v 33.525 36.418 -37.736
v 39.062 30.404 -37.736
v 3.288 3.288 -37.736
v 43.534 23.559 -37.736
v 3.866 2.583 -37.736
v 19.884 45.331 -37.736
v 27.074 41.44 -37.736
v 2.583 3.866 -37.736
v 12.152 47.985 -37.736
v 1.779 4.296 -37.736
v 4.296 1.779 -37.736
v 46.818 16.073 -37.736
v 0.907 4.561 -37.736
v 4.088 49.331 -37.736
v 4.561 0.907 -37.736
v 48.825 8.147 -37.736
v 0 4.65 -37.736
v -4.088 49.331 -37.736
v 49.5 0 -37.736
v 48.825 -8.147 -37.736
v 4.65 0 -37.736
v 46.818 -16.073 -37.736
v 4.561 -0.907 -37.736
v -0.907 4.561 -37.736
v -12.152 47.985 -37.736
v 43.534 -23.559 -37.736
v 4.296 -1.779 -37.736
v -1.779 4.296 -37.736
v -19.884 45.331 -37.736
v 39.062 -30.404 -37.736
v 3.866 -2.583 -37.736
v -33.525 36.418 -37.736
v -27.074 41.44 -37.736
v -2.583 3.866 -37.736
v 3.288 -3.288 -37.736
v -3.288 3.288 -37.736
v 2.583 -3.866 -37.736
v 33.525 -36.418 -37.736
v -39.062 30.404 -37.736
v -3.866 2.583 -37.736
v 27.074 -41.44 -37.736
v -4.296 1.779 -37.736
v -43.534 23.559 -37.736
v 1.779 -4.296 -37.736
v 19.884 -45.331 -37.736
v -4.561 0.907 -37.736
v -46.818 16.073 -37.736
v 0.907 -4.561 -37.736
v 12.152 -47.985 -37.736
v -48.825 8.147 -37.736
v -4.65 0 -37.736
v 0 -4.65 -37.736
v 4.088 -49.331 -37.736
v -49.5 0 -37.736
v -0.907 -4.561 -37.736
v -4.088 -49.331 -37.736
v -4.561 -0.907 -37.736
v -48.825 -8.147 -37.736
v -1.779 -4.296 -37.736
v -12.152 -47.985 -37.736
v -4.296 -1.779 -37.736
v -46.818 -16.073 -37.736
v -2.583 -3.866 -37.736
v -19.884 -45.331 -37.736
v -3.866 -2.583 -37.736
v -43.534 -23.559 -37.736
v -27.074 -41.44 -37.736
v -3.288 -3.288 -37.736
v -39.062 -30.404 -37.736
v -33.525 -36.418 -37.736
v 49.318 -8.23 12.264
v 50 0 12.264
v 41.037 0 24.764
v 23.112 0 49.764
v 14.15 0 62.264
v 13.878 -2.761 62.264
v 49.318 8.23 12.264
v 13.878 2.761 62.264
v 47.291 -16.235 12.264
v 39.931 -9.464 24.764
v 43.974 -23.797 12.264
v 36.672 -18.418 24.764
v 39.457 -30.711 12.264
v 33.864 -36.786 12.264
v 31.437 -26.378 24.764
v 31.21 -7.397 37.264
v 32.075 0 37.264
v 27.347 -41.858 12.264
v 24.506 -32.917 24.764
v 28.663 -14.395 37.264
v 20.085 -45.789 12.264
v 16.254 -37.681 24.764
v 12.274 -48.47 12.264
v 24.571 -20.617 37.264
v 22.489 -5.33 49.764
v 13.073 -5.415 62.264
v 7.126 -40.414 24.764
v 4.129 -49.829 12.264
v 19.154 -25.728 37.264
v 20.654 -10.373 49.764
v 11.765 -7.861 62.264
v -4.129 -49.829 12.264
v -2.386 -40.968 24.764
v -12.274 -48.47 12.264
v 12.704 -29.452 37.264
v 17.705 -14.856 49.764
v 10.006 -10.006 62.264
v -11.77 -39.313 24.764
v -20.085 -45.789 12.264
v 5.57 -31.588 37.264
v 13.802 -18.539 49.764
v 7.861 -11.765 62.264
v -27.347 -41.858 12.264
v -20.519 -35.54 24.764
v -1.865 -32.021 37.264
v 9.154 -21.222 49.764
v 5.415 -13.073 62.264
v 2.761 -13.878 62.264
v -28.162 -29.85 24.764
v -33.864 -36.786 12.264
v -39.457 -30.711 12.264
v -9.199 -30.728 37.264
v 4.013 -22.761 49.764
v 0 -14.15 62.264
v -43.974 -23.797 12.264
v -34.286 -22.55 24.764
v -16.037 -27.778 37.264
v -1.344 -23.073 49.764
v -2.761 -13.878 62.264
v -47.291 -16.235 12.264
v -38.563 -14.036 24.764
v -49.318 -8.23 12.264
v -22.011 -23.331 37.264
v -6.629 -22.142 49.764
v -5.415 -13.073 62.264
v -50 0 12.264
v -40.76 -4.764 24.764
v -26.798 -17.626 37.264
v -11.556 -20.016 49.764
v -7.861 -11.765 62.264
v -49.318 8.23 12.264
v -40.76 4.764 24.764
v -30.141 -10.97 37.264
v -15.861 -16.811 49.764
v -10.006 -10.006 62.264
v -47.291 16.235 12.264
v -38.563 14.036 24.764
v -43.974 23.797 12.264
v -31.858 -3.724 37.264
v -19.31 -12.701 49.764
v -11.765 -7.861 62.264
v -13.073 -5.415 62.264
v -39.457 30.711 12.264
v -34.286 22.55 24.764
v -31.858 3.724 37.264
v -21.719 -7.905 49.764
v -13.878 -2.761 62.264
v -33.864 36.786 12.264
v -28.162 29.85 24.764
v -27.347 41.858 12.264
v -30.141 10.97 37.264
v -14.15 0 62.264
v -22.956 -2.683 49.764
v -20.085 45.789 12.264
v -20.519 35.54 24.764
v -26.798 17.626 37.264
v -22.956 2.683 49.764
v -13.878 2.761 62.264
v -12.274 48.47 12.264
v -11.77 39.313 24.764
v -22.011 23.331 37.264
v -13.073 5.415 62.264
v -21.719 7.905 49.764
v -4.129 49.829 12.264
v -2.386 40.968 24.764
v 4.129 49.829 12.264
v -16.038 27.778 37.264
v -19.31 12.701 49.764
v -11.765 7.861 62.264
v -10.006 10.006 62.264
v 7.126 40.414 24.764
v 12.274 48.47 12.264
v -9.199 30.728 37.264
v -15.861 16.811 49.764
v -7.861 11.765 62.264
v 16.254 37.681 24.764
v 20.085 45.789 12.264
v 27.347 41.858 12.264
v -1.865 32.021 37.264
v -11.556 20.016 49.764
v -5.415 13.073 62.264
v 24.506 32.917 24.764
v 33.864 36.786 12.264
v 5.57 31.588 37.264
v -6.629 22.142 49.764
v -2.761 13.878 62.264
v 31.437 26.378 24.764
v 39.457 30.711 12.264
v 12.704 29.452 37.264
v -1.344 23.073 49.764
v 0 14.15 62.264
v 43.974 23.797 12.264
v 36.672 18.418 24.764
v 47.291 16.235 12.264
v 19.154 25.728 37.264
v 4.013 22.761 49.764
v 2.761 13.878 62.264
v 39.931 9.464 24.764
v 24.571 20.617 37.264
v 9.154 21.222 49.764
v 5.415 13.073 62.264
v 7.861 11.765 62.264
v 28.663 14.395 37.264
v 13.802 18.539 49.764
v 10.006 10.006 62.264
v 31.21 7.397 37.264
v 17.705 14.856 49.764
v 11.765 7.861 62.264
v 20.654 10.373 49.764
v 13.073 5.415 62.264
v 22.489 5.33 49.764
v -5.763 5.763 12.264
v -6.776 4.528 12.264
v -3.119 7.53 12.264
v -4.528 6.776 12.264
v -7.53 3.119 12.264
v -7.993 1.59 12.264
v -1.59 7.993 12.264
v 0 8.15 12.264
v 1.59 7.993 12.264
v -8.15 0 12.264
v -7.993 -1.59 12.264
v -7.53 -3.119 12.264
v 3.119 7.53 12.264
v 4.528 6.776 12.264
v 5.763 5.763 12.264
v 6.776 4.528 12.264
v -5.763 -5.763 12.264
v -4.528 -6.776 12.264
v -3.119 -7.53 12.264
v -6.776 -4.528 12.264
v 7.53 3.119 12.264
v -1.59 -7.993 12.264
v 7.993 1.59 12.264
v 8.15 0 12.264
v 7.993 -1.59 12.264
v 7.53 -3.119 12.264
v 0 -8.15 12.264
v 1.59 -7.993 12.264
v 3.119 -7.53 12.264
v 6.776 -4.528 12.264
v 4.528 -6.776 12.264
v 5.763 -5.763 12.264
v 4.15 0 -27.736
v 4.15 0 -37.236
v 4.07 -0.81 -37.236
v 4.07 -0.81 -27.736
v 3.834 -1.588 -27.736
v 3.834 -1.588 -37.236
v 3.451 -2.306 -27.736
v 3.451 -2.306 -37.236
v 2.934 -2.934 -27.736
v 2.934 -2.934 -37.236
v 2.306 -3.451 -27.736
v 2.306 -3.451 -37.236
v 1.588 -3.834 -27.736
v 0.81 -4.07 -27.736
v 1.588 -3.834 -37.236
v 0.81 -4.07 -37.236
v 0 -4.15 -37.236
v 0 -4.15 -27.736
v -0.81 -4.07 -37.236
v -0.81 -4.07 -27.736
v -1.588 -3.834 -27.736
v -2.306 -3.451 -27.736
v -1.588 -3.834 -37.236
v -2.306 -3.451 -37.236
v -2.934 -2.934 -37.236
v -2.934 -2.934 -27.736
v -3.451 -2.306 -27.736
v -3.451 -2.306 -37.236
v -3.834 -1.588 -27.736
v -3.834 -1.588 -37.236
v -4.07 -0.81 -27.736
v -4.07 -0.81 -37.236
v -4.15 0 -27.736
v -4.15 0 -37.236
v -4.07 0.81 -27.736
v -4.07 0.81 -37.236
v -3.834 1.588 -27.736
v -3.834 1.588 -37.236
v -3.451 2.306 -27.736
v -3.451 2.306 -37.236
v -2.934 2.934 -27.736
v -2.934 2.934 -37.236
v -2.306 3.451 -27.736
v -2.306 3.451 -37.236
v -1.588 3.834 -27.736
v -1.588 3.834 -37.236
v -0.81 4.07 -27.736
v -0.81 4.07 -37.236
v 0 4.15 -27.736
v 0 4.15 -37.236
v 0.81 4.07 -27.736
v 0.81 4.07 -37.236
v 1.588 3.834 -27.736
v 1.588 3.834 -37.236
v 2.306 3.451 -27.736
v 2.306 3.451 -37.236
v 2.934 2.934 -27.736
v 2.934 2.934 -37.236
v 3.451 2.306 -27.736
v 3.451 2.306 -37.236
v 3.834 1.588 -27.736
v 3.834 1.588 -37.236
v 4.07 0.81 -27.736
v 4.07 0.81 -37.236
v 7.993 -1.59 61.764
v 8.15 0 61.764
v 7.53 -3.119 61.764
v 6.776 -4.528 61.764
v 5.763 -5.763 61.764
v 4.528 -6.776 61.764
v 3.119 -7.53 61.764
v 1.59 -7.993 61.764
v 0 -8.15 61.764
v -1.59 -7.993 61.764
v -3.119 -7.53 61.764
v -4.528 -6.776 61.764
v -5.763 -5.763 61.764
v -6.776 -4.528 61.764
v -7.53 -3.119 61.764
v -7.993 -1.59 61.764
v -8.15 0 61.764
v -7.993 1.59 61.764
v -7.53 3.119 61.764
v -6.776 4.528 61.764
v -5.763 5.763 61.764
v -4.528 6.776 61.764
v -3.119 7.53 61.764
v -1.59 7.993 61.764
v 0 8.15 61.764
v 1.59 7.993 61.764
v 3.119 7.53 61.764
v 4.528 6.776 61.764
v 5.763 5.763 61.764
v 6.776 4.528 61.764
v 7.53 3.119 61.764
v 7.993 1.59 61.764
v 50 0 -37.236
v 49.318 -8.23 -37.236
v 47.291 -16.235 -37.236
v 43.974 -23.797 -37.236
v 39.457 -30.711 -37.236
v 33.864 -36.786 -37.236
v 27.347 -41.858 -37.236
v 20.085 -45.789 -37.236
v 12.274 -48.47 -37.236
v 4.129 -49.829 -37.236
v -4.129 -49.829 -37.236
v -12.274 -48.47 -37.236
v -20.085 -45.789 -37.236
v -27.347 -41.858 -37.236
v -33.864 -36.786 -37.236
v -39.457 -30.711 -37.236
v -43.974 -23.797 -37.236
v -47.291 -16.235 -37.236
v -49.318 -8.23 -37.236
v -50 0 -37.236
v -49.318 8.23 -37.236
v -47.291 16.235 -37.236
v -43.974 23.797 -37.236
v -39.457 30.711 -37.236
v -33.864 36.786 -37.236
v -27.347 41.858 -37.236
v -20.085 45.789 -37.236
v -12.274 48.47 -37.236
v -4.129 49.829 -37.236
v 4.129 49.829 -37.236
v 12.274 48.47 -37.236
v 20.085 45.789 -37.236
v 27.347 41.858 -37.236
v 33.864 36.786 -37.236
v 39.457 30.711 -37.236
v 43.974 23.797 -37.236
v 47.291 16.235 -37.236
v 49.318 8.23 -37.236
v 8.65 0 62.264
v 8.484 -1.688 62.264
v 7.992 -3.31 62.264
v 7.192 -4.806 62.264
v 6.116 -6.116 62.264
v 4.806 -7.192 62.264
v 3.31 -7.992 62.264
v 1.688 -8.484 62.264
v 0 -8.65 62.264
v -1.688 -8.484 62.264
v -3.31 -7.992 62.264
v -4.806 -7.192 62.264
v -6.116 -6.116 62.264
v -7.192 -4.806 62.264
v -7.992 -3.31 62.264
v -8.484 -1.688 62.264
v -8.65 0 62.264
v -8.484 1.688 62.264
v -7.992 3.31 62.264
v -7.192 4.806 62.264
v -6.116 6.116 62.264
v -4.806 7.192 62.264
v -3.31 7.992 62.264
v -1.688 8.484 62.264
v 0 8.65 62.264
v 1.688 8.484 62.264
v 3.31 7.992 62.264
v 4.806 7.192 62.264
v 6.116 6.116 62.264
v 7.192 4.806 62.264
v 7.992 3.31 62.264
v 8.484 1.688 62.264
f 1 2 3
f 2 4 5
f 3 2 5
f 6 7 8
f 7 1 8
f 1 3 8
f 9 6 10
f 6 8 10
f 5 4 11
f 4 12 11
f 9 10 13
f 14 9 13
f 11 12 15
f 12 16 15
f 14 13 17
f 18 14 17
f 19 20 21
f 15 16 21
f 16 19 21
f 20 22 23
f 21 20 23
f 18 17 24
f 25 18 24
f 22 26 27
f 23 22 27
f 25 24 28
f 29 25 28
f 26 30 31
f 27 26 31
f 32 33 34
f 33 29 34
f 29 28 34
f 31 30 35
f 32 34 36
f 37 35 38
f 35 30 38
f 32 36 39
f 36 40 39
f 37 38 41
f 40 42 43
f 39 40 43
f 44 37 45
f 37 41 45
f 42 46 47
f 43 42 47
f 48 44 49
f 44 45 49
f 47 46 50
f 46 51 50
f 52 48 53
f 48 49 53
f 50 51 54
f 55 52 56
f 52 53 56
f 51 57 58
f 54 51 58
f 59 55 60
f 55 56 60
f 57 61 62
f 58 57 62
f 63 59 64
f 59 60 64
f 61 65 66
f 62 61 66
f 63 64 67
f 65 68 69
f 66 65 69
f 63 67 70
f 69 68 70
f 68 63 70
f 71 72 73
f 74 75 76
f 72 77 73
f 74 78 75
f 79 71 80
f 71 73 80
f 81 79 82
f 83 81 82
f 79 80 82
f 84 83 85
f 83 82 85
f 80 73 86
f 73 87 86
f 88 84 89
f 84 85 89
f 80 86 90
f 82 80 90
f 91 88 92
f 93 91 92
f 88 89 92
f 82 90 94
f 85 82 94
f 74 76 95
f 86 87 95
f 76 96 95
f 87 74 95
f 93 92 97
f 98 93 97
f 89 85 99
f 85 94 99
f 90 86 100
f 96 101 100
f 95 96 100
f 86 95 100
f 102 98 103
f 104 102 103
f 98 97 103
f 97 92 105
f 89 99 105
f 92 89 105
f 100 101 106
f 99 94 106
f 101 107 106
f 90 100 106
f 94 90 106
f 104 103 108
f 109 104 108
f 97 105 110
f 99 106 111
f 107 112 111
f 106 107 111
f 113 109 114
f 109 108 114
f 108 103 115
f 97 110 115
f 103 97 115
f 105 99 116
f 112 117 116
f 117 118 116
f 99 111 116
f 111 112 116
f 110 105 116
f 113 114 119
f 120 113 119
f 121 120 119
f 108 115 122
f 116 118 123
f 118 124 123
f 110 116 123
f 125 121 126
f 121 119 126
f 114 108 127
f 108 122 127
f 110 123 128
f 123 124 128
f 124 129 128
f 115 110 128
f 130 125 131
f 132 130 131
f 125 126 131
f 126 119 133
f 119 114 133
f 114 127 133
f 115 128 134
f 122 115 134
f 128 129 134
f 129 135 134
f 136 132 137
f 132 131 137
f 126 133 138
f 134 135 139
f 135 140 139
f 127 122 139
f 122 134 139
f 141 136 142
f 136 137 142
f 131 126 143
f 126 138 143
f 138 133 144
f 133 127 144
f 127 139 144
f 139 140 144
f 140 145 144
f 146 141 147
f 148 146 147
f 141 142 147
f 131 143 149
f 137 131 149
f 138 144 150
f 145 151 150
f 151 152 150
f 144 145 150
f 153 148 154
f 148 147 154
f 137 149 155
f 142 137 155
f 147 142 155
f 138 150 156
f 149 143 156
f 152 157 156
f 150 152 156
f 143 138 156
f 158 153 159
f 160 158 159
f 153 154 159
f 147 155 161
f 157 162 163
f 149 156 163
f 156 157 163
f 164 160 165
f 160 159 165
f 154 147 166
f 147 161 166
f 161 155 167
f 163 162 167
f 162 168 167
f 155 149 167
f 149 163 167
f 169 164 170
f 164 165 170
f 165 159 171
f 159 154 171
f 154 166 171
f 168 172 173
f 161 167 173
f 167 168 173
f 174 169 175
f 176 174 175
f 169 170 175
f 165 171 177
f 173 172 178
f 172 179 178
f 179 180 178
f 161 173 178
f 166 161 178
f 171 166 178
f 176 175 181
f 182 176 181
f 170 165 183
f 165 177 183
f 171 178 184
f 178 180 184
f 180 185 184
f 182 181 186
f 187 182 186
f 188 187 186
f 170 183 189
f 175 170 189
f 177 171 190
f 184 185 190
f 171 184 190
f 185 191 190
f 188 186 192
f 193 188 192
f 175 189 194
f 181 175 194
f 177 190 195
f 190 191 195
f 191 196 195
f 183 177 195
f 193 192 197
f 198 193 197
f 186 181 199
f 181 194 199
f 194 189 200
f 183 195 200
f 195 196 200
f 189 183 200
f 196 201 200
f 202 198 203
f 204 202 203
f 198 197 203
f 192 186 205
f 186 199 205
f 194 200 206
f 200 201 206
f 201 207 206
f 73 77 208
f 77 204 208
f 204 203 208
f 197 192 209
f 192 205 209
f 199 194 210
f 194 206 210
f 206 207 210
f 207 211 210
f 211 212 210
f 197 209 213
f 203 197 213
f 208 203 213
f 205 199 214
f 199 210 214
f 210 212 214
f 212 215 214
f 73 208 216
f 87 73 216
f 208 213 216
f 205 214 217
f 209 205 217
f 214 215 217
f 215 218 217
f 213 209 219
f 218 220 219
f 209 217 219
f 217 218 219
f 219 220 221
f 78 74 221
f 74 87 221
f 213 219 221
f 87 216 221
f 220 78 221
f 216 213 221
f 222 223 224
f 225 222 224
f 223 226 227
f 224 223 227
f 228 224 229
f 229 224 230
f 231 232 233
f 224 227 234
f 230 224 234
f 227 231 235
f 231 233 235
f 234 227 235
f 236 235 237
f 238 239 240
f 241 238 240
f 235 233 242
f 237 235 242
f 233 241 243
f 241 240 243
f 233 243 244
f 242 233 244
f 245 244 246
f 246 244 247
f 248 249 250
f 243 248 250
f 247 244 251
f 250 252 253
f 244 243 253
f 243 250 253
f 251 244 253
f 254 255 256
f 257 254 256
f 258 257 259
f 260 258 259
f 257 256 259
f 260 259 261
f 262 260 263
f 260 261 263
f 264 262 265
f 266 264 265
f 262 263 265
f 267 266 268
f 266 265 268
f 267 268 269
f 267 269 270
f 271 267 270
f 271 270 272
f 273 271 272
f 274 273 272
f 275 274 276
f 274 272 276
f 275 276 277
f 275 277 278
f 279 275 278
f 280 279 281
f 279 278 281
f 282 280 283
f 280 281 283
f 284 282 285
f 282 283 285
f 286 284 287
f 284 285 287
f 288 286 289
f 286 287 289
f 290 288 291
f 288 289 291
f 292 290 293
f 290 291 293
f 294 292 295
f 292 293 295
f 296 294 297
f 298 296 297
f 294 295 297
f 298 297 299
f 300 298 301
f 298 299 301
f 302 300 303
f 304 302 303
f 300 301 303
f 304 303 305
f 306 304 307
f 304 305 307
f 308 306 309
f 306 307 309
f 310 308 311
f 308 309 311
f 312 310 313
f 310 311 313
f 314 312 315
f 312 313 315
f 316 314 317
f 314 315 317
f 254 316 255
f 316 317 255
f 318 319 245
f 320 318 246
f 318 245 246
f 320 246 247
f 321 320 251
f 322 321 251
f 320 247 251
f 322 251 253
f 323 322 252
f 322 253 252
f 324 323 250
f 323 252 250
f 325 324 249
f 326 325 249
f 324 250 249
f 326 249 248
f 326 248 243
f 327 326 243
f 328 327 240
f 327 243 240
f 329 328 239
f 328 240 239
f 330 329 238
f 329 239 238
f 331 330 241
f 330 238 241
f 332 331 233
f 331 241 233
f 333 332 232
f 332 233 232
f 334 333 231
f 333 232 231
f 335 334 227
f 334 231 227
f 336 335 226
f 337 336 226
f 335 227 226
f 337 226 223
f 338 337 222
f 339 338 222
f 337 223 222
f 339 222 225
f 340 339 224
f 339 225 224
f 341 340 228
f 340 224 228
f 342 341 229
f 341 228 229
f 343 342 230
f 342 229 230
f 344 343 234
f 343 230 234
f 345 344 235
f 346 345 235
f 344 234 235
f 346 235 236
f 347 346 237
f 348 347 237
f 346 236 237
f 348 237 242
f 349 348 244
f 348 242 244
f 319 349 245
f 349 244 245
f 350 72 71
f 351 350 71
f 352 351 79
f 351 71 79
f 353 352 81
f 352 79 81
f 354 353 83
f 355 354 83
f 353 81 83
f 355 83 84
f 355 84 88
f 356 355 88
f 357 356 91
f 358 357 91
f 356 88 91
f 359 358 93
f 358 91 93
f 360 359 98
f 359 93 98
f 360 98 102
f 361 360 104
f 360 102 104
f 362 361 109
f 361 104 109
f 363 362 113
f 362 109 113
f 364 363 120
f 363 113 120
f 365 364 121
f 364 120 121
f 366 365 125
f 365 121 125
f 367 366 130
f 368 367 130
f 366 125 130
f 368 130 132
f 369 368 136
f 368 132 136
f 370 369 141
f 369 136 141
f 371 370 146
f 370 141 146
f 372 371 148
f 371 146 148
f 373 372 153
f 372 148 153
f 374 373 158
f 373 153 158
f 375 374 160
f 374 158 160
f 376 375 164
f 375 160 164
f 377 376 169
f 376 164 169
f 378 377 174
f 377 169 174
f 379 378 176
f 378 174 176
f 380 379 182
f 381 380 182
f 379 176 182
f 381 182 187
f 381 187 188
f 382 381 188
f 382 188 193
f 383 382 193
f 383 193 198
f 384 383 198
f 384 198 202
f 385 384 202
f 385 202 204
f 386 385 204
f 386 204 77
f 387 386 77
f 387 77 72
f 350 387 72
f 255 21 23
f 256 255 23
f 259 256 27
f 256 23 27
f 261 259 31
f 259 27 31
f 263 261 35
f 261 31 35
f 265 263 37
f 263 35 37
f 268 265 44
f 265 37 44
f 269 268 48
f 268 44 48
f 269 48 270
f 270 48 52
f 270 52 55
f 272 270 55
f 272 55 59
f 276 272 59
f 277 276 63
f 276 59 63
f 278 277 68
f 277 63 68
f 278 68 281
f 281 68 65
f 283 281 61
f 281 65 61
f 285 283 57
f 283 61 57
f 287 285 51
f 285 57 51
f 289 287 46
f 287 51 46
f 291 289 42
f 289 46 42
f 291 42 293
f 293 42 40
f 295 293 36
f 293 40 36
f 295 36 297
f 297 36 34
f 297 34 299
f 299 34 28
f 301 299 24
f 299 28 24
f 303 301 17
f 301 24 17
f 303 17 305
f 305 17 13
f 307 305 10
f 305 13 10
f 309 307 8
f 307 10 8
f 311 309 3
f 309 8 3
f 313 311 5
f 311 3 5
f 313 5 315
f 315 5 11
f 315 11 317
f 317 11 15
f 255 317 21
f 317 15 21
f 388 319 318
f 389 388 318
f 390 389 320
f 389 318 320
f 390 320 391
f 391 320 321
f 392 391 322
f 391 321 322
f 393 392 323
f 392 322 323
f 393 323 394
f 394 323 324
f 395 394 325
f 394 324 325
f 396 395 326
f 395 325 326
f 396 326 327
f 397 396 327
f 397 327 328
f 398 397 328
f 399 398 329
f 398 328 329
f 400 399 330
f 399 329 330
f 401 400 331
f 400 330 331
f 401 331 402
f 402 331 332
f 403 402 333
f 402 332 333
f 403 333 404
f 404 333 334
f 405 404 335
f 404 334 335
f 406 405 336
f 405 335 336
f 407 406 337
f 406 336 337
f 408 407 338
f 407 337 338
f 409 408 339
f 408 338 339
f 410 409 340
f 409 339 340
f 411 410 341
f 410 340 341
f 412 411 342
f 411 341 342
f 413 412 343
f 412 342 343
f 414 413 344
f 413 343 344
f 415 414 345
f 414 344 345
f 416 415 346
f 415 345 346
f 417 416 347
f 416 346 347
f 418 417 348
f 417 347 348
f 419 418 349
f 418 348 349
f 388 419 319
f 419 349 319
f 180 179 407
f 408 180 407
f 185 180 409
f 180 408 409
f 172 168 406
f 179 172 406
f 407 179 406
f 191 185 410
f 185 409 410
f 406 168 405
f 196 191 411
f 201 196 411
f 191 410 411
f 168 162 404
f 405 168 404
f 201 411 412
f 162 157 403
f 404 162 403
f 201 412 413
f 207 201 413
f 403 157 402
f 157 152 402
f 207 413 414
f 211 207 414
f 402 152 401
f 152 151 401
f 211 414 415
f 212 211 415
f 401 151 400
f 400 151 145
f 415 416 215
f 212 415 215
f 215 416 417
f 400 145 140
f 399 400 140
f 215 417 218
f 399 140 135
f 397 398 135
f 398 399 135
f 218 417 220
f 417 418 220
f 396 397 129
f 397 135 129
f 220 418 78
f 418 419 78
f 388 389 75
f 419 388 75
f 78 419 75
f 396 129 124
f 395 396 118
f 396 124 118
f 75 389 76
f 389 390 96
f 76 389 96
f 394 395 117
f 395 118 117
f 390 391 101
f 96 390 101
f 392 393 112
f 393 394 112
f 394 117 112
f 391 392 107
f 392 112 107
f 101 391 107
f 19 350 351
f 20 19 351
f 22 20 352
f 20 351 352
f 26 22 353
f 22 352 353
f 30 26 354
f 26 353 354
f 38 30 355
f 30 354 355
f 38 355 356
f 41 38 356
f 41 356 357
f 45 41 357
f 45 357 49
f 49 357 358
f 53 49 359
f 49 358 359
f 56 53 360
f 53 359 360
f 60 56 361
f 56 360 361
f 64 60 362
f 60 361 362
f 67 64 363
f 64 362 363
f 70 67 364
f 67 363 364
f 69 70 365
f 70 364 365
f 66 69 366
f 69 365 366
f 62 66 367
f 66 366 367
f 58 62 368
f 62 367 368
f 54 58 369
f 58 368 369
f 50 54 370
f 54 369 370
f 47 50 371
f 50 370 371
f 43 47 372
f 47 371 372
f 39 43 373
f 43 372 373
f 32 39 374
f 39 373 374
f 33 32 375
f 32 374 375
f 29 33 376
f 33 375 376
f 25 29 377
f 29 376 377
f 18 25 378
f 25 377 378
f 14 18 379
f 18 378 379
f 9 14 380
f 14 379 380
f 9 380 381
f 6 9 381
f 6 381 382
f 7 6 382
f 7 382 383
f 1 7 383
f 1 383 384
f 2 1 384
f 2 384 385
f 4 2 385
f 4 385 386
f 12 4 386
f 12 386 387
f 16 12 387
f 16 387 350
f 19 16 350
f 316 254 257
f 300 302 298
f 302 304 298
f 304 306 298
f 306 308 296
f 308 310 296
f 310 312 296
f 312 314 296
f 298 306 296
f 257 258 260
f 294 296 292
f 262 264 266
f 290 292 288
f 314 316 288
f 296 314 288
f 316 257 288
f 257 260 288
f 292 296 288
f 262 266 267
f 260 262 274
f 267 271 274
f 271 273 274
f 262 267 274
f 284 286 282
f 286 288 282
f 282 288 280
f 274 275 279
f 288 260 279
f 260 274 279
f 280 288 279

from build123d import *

# Parameters (mm, degrees)
CHAMFER1_SIZE = 0.5


with BuildPart() as part:
    # Sketch1 → Revolve1 (revolve)
    with BuildSketch(Plane(origin=(0, 0, 0), x_dir=(1, 0, 0), z_dir=(0, 1, 0))):
        Polygon((0, 27.73647874), (4.15, 27.73647874), (4.15, 37.73647874), (50, 37.73647874), (50, -12.26352126), (14.15, -62.26352126), (8.15, -62.26352126), (8.15, -12.26352126), (0, -12.26352126), align=None)
    revolve(axis=Axis((0, 0, 12.26352126), (0, 0, -1)))

    # Chamfer1
    chamfer1_edges = [part.edges().sort_by_distance(p)[0] for p in [
        (-8.15, 0, 62.26352126),
        (-50, 0, -37.73647874),
        (-4.15, 0, -37.73647874),
    ]]
    chamfer(chamfer1_edges, length=CHAMFER1_SIZE)


solid = part.part
